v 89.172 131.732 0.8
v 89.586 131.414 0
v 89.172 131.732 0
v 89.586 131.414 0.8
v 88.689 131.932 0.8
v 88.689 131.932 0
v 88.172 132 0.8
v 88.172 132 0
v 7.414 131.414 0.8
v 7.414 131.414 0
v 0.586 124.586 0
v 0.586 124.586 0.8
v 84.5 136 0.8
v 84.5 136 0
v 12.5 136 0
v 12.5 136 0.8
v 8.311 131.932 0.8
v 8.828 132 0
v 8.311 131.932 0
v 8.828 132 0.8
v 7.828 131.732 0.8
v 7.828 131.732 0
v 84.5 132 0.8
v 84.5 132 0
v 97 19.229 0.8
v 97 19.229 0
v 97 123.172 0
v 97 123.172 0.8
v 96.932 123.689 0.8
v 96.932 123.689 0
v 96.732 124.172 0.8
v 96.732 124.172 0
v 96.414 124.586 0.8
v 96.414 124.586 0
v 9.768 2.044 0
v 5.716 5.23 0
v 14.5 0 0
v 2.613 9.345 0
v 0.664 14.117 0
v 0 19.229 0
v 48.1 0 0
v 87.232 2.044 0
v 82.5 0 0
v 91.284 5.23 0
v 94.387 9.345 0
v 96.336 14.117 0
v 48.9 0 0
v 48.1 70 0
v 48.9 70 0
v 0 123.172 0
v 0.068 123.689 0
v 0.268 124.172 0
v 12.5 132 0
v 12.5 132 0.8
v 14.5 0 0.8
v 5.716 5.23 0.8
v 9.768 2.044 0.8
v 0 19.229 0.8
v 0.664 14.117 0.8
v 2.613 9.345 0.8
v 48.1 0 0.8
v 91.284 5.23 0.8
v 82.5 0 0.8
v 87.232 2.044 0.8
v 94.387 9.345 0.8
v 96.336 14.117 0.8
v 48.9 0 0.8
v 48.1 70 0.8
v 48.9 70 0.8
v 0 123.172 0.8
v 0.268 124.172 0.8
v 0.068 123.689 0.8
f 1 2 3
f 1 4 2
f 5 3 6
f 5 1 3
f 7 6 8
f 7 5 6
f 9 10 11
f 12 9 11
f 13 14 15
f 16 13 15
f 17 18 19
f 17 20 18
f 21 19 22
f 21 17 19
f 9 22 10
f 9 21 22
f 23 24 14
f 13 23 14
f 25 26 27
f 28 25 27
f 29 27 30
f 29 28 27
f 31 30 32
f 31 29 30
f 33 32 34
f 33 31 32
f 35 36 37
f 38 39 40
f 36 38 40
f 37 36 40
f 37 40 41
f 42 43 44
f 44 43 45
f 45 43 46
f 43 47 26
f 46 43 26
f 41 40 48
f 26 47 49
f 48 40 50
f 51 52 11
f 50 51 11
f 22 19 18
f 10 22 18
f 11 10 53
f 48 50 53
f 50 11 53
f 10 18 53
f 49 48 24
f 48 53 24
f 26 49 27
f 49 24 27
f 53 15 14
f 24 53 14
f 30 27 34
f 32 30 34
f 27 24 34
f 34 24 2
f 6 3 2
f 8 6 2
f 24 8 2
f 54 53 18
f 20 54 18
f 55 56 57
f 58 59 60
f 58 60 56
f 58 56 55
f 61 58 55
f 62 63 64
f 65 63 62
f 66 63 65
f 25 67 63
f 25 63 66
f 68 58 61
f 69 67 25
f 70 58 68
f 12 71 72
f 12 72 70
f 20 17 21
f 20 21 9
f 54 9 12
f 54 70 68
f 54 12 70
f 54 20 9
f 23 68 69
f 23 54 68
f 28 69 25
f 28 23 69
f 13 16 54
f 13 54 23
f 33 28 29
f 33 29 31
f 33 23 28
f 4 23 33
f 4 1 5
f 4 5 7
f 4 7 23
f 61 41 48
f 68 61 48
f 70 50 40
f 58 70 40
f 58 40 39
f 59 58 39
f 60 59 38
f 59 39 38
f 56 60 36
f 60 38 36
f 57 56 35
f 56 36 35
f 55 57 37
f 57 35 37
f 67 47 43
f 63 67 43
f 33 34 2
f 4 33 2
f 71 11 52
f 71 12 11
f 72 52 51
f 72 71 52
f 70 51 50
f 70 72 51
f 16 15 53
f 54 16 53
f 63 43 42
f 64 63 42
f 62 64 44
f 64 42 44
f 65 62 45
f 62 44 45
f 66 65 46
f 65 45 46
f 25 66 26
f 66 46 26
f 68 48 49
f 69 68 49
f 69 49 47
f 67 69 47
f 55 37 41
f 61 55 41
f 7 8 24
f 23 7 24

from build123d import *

# Parameters (mm, degrees)
BOSS_EXTRUDE1_DEPTH = 0.8
FILLET1_R           = 2


with BuildPart() as part:
    # Sketch1 → Boss-Extrude1 (new body)
    with BuildSketch(Plane.XY):
        with BuildLine():
            Line((14.5, 0), (48.1, 0))
            Line((48.1, 0), (48.1, 70))
            Line((48.1, 70), (48.9, 70))
            Line((48.9, 70), (48.9, 0))
            Line((48.9, 0), (82.5, 0))
            ThreePointArc((82.5, 0), (92.968719423, 7.187289944), (97, 19.228884523))
            Line((97, 19.228884523), (97, 124))
            Line((97, 124), (89, 132))
            Line((89, 132), (84.5, 132))
            Line((84.5, 132), (84.5, 136))
            Line((84.5, 136), (45.939865431, 136))
            Line((45.939865431, 136), (12.5, 136))
            Line((12.5, 136), (12.5, 132))
            Line((12.5, 132), (8, 132))
            Line((8, 132), (0, 124))
            Line((0, 124), (0, 19.228884523))
            ThreePointArc((0, 19.228884523), (4.031280577, 7.187289944), (14.5, 0))
        make_face()
    extrude(amount=BOSS_EXTRUDE1_DEPTH)

    # Fillet1
    fillet1_edges = [part.edges().sort_by_distance(p)[0] for p in [
        (89, 132, 0.4),
        (97, 124, 0.4),
        (0, 124, 0.4),
        (8, 132, 0.4),
    ]]
    fillet(fillet1_edges, radius=FILLET1_R)


solid = part.part
